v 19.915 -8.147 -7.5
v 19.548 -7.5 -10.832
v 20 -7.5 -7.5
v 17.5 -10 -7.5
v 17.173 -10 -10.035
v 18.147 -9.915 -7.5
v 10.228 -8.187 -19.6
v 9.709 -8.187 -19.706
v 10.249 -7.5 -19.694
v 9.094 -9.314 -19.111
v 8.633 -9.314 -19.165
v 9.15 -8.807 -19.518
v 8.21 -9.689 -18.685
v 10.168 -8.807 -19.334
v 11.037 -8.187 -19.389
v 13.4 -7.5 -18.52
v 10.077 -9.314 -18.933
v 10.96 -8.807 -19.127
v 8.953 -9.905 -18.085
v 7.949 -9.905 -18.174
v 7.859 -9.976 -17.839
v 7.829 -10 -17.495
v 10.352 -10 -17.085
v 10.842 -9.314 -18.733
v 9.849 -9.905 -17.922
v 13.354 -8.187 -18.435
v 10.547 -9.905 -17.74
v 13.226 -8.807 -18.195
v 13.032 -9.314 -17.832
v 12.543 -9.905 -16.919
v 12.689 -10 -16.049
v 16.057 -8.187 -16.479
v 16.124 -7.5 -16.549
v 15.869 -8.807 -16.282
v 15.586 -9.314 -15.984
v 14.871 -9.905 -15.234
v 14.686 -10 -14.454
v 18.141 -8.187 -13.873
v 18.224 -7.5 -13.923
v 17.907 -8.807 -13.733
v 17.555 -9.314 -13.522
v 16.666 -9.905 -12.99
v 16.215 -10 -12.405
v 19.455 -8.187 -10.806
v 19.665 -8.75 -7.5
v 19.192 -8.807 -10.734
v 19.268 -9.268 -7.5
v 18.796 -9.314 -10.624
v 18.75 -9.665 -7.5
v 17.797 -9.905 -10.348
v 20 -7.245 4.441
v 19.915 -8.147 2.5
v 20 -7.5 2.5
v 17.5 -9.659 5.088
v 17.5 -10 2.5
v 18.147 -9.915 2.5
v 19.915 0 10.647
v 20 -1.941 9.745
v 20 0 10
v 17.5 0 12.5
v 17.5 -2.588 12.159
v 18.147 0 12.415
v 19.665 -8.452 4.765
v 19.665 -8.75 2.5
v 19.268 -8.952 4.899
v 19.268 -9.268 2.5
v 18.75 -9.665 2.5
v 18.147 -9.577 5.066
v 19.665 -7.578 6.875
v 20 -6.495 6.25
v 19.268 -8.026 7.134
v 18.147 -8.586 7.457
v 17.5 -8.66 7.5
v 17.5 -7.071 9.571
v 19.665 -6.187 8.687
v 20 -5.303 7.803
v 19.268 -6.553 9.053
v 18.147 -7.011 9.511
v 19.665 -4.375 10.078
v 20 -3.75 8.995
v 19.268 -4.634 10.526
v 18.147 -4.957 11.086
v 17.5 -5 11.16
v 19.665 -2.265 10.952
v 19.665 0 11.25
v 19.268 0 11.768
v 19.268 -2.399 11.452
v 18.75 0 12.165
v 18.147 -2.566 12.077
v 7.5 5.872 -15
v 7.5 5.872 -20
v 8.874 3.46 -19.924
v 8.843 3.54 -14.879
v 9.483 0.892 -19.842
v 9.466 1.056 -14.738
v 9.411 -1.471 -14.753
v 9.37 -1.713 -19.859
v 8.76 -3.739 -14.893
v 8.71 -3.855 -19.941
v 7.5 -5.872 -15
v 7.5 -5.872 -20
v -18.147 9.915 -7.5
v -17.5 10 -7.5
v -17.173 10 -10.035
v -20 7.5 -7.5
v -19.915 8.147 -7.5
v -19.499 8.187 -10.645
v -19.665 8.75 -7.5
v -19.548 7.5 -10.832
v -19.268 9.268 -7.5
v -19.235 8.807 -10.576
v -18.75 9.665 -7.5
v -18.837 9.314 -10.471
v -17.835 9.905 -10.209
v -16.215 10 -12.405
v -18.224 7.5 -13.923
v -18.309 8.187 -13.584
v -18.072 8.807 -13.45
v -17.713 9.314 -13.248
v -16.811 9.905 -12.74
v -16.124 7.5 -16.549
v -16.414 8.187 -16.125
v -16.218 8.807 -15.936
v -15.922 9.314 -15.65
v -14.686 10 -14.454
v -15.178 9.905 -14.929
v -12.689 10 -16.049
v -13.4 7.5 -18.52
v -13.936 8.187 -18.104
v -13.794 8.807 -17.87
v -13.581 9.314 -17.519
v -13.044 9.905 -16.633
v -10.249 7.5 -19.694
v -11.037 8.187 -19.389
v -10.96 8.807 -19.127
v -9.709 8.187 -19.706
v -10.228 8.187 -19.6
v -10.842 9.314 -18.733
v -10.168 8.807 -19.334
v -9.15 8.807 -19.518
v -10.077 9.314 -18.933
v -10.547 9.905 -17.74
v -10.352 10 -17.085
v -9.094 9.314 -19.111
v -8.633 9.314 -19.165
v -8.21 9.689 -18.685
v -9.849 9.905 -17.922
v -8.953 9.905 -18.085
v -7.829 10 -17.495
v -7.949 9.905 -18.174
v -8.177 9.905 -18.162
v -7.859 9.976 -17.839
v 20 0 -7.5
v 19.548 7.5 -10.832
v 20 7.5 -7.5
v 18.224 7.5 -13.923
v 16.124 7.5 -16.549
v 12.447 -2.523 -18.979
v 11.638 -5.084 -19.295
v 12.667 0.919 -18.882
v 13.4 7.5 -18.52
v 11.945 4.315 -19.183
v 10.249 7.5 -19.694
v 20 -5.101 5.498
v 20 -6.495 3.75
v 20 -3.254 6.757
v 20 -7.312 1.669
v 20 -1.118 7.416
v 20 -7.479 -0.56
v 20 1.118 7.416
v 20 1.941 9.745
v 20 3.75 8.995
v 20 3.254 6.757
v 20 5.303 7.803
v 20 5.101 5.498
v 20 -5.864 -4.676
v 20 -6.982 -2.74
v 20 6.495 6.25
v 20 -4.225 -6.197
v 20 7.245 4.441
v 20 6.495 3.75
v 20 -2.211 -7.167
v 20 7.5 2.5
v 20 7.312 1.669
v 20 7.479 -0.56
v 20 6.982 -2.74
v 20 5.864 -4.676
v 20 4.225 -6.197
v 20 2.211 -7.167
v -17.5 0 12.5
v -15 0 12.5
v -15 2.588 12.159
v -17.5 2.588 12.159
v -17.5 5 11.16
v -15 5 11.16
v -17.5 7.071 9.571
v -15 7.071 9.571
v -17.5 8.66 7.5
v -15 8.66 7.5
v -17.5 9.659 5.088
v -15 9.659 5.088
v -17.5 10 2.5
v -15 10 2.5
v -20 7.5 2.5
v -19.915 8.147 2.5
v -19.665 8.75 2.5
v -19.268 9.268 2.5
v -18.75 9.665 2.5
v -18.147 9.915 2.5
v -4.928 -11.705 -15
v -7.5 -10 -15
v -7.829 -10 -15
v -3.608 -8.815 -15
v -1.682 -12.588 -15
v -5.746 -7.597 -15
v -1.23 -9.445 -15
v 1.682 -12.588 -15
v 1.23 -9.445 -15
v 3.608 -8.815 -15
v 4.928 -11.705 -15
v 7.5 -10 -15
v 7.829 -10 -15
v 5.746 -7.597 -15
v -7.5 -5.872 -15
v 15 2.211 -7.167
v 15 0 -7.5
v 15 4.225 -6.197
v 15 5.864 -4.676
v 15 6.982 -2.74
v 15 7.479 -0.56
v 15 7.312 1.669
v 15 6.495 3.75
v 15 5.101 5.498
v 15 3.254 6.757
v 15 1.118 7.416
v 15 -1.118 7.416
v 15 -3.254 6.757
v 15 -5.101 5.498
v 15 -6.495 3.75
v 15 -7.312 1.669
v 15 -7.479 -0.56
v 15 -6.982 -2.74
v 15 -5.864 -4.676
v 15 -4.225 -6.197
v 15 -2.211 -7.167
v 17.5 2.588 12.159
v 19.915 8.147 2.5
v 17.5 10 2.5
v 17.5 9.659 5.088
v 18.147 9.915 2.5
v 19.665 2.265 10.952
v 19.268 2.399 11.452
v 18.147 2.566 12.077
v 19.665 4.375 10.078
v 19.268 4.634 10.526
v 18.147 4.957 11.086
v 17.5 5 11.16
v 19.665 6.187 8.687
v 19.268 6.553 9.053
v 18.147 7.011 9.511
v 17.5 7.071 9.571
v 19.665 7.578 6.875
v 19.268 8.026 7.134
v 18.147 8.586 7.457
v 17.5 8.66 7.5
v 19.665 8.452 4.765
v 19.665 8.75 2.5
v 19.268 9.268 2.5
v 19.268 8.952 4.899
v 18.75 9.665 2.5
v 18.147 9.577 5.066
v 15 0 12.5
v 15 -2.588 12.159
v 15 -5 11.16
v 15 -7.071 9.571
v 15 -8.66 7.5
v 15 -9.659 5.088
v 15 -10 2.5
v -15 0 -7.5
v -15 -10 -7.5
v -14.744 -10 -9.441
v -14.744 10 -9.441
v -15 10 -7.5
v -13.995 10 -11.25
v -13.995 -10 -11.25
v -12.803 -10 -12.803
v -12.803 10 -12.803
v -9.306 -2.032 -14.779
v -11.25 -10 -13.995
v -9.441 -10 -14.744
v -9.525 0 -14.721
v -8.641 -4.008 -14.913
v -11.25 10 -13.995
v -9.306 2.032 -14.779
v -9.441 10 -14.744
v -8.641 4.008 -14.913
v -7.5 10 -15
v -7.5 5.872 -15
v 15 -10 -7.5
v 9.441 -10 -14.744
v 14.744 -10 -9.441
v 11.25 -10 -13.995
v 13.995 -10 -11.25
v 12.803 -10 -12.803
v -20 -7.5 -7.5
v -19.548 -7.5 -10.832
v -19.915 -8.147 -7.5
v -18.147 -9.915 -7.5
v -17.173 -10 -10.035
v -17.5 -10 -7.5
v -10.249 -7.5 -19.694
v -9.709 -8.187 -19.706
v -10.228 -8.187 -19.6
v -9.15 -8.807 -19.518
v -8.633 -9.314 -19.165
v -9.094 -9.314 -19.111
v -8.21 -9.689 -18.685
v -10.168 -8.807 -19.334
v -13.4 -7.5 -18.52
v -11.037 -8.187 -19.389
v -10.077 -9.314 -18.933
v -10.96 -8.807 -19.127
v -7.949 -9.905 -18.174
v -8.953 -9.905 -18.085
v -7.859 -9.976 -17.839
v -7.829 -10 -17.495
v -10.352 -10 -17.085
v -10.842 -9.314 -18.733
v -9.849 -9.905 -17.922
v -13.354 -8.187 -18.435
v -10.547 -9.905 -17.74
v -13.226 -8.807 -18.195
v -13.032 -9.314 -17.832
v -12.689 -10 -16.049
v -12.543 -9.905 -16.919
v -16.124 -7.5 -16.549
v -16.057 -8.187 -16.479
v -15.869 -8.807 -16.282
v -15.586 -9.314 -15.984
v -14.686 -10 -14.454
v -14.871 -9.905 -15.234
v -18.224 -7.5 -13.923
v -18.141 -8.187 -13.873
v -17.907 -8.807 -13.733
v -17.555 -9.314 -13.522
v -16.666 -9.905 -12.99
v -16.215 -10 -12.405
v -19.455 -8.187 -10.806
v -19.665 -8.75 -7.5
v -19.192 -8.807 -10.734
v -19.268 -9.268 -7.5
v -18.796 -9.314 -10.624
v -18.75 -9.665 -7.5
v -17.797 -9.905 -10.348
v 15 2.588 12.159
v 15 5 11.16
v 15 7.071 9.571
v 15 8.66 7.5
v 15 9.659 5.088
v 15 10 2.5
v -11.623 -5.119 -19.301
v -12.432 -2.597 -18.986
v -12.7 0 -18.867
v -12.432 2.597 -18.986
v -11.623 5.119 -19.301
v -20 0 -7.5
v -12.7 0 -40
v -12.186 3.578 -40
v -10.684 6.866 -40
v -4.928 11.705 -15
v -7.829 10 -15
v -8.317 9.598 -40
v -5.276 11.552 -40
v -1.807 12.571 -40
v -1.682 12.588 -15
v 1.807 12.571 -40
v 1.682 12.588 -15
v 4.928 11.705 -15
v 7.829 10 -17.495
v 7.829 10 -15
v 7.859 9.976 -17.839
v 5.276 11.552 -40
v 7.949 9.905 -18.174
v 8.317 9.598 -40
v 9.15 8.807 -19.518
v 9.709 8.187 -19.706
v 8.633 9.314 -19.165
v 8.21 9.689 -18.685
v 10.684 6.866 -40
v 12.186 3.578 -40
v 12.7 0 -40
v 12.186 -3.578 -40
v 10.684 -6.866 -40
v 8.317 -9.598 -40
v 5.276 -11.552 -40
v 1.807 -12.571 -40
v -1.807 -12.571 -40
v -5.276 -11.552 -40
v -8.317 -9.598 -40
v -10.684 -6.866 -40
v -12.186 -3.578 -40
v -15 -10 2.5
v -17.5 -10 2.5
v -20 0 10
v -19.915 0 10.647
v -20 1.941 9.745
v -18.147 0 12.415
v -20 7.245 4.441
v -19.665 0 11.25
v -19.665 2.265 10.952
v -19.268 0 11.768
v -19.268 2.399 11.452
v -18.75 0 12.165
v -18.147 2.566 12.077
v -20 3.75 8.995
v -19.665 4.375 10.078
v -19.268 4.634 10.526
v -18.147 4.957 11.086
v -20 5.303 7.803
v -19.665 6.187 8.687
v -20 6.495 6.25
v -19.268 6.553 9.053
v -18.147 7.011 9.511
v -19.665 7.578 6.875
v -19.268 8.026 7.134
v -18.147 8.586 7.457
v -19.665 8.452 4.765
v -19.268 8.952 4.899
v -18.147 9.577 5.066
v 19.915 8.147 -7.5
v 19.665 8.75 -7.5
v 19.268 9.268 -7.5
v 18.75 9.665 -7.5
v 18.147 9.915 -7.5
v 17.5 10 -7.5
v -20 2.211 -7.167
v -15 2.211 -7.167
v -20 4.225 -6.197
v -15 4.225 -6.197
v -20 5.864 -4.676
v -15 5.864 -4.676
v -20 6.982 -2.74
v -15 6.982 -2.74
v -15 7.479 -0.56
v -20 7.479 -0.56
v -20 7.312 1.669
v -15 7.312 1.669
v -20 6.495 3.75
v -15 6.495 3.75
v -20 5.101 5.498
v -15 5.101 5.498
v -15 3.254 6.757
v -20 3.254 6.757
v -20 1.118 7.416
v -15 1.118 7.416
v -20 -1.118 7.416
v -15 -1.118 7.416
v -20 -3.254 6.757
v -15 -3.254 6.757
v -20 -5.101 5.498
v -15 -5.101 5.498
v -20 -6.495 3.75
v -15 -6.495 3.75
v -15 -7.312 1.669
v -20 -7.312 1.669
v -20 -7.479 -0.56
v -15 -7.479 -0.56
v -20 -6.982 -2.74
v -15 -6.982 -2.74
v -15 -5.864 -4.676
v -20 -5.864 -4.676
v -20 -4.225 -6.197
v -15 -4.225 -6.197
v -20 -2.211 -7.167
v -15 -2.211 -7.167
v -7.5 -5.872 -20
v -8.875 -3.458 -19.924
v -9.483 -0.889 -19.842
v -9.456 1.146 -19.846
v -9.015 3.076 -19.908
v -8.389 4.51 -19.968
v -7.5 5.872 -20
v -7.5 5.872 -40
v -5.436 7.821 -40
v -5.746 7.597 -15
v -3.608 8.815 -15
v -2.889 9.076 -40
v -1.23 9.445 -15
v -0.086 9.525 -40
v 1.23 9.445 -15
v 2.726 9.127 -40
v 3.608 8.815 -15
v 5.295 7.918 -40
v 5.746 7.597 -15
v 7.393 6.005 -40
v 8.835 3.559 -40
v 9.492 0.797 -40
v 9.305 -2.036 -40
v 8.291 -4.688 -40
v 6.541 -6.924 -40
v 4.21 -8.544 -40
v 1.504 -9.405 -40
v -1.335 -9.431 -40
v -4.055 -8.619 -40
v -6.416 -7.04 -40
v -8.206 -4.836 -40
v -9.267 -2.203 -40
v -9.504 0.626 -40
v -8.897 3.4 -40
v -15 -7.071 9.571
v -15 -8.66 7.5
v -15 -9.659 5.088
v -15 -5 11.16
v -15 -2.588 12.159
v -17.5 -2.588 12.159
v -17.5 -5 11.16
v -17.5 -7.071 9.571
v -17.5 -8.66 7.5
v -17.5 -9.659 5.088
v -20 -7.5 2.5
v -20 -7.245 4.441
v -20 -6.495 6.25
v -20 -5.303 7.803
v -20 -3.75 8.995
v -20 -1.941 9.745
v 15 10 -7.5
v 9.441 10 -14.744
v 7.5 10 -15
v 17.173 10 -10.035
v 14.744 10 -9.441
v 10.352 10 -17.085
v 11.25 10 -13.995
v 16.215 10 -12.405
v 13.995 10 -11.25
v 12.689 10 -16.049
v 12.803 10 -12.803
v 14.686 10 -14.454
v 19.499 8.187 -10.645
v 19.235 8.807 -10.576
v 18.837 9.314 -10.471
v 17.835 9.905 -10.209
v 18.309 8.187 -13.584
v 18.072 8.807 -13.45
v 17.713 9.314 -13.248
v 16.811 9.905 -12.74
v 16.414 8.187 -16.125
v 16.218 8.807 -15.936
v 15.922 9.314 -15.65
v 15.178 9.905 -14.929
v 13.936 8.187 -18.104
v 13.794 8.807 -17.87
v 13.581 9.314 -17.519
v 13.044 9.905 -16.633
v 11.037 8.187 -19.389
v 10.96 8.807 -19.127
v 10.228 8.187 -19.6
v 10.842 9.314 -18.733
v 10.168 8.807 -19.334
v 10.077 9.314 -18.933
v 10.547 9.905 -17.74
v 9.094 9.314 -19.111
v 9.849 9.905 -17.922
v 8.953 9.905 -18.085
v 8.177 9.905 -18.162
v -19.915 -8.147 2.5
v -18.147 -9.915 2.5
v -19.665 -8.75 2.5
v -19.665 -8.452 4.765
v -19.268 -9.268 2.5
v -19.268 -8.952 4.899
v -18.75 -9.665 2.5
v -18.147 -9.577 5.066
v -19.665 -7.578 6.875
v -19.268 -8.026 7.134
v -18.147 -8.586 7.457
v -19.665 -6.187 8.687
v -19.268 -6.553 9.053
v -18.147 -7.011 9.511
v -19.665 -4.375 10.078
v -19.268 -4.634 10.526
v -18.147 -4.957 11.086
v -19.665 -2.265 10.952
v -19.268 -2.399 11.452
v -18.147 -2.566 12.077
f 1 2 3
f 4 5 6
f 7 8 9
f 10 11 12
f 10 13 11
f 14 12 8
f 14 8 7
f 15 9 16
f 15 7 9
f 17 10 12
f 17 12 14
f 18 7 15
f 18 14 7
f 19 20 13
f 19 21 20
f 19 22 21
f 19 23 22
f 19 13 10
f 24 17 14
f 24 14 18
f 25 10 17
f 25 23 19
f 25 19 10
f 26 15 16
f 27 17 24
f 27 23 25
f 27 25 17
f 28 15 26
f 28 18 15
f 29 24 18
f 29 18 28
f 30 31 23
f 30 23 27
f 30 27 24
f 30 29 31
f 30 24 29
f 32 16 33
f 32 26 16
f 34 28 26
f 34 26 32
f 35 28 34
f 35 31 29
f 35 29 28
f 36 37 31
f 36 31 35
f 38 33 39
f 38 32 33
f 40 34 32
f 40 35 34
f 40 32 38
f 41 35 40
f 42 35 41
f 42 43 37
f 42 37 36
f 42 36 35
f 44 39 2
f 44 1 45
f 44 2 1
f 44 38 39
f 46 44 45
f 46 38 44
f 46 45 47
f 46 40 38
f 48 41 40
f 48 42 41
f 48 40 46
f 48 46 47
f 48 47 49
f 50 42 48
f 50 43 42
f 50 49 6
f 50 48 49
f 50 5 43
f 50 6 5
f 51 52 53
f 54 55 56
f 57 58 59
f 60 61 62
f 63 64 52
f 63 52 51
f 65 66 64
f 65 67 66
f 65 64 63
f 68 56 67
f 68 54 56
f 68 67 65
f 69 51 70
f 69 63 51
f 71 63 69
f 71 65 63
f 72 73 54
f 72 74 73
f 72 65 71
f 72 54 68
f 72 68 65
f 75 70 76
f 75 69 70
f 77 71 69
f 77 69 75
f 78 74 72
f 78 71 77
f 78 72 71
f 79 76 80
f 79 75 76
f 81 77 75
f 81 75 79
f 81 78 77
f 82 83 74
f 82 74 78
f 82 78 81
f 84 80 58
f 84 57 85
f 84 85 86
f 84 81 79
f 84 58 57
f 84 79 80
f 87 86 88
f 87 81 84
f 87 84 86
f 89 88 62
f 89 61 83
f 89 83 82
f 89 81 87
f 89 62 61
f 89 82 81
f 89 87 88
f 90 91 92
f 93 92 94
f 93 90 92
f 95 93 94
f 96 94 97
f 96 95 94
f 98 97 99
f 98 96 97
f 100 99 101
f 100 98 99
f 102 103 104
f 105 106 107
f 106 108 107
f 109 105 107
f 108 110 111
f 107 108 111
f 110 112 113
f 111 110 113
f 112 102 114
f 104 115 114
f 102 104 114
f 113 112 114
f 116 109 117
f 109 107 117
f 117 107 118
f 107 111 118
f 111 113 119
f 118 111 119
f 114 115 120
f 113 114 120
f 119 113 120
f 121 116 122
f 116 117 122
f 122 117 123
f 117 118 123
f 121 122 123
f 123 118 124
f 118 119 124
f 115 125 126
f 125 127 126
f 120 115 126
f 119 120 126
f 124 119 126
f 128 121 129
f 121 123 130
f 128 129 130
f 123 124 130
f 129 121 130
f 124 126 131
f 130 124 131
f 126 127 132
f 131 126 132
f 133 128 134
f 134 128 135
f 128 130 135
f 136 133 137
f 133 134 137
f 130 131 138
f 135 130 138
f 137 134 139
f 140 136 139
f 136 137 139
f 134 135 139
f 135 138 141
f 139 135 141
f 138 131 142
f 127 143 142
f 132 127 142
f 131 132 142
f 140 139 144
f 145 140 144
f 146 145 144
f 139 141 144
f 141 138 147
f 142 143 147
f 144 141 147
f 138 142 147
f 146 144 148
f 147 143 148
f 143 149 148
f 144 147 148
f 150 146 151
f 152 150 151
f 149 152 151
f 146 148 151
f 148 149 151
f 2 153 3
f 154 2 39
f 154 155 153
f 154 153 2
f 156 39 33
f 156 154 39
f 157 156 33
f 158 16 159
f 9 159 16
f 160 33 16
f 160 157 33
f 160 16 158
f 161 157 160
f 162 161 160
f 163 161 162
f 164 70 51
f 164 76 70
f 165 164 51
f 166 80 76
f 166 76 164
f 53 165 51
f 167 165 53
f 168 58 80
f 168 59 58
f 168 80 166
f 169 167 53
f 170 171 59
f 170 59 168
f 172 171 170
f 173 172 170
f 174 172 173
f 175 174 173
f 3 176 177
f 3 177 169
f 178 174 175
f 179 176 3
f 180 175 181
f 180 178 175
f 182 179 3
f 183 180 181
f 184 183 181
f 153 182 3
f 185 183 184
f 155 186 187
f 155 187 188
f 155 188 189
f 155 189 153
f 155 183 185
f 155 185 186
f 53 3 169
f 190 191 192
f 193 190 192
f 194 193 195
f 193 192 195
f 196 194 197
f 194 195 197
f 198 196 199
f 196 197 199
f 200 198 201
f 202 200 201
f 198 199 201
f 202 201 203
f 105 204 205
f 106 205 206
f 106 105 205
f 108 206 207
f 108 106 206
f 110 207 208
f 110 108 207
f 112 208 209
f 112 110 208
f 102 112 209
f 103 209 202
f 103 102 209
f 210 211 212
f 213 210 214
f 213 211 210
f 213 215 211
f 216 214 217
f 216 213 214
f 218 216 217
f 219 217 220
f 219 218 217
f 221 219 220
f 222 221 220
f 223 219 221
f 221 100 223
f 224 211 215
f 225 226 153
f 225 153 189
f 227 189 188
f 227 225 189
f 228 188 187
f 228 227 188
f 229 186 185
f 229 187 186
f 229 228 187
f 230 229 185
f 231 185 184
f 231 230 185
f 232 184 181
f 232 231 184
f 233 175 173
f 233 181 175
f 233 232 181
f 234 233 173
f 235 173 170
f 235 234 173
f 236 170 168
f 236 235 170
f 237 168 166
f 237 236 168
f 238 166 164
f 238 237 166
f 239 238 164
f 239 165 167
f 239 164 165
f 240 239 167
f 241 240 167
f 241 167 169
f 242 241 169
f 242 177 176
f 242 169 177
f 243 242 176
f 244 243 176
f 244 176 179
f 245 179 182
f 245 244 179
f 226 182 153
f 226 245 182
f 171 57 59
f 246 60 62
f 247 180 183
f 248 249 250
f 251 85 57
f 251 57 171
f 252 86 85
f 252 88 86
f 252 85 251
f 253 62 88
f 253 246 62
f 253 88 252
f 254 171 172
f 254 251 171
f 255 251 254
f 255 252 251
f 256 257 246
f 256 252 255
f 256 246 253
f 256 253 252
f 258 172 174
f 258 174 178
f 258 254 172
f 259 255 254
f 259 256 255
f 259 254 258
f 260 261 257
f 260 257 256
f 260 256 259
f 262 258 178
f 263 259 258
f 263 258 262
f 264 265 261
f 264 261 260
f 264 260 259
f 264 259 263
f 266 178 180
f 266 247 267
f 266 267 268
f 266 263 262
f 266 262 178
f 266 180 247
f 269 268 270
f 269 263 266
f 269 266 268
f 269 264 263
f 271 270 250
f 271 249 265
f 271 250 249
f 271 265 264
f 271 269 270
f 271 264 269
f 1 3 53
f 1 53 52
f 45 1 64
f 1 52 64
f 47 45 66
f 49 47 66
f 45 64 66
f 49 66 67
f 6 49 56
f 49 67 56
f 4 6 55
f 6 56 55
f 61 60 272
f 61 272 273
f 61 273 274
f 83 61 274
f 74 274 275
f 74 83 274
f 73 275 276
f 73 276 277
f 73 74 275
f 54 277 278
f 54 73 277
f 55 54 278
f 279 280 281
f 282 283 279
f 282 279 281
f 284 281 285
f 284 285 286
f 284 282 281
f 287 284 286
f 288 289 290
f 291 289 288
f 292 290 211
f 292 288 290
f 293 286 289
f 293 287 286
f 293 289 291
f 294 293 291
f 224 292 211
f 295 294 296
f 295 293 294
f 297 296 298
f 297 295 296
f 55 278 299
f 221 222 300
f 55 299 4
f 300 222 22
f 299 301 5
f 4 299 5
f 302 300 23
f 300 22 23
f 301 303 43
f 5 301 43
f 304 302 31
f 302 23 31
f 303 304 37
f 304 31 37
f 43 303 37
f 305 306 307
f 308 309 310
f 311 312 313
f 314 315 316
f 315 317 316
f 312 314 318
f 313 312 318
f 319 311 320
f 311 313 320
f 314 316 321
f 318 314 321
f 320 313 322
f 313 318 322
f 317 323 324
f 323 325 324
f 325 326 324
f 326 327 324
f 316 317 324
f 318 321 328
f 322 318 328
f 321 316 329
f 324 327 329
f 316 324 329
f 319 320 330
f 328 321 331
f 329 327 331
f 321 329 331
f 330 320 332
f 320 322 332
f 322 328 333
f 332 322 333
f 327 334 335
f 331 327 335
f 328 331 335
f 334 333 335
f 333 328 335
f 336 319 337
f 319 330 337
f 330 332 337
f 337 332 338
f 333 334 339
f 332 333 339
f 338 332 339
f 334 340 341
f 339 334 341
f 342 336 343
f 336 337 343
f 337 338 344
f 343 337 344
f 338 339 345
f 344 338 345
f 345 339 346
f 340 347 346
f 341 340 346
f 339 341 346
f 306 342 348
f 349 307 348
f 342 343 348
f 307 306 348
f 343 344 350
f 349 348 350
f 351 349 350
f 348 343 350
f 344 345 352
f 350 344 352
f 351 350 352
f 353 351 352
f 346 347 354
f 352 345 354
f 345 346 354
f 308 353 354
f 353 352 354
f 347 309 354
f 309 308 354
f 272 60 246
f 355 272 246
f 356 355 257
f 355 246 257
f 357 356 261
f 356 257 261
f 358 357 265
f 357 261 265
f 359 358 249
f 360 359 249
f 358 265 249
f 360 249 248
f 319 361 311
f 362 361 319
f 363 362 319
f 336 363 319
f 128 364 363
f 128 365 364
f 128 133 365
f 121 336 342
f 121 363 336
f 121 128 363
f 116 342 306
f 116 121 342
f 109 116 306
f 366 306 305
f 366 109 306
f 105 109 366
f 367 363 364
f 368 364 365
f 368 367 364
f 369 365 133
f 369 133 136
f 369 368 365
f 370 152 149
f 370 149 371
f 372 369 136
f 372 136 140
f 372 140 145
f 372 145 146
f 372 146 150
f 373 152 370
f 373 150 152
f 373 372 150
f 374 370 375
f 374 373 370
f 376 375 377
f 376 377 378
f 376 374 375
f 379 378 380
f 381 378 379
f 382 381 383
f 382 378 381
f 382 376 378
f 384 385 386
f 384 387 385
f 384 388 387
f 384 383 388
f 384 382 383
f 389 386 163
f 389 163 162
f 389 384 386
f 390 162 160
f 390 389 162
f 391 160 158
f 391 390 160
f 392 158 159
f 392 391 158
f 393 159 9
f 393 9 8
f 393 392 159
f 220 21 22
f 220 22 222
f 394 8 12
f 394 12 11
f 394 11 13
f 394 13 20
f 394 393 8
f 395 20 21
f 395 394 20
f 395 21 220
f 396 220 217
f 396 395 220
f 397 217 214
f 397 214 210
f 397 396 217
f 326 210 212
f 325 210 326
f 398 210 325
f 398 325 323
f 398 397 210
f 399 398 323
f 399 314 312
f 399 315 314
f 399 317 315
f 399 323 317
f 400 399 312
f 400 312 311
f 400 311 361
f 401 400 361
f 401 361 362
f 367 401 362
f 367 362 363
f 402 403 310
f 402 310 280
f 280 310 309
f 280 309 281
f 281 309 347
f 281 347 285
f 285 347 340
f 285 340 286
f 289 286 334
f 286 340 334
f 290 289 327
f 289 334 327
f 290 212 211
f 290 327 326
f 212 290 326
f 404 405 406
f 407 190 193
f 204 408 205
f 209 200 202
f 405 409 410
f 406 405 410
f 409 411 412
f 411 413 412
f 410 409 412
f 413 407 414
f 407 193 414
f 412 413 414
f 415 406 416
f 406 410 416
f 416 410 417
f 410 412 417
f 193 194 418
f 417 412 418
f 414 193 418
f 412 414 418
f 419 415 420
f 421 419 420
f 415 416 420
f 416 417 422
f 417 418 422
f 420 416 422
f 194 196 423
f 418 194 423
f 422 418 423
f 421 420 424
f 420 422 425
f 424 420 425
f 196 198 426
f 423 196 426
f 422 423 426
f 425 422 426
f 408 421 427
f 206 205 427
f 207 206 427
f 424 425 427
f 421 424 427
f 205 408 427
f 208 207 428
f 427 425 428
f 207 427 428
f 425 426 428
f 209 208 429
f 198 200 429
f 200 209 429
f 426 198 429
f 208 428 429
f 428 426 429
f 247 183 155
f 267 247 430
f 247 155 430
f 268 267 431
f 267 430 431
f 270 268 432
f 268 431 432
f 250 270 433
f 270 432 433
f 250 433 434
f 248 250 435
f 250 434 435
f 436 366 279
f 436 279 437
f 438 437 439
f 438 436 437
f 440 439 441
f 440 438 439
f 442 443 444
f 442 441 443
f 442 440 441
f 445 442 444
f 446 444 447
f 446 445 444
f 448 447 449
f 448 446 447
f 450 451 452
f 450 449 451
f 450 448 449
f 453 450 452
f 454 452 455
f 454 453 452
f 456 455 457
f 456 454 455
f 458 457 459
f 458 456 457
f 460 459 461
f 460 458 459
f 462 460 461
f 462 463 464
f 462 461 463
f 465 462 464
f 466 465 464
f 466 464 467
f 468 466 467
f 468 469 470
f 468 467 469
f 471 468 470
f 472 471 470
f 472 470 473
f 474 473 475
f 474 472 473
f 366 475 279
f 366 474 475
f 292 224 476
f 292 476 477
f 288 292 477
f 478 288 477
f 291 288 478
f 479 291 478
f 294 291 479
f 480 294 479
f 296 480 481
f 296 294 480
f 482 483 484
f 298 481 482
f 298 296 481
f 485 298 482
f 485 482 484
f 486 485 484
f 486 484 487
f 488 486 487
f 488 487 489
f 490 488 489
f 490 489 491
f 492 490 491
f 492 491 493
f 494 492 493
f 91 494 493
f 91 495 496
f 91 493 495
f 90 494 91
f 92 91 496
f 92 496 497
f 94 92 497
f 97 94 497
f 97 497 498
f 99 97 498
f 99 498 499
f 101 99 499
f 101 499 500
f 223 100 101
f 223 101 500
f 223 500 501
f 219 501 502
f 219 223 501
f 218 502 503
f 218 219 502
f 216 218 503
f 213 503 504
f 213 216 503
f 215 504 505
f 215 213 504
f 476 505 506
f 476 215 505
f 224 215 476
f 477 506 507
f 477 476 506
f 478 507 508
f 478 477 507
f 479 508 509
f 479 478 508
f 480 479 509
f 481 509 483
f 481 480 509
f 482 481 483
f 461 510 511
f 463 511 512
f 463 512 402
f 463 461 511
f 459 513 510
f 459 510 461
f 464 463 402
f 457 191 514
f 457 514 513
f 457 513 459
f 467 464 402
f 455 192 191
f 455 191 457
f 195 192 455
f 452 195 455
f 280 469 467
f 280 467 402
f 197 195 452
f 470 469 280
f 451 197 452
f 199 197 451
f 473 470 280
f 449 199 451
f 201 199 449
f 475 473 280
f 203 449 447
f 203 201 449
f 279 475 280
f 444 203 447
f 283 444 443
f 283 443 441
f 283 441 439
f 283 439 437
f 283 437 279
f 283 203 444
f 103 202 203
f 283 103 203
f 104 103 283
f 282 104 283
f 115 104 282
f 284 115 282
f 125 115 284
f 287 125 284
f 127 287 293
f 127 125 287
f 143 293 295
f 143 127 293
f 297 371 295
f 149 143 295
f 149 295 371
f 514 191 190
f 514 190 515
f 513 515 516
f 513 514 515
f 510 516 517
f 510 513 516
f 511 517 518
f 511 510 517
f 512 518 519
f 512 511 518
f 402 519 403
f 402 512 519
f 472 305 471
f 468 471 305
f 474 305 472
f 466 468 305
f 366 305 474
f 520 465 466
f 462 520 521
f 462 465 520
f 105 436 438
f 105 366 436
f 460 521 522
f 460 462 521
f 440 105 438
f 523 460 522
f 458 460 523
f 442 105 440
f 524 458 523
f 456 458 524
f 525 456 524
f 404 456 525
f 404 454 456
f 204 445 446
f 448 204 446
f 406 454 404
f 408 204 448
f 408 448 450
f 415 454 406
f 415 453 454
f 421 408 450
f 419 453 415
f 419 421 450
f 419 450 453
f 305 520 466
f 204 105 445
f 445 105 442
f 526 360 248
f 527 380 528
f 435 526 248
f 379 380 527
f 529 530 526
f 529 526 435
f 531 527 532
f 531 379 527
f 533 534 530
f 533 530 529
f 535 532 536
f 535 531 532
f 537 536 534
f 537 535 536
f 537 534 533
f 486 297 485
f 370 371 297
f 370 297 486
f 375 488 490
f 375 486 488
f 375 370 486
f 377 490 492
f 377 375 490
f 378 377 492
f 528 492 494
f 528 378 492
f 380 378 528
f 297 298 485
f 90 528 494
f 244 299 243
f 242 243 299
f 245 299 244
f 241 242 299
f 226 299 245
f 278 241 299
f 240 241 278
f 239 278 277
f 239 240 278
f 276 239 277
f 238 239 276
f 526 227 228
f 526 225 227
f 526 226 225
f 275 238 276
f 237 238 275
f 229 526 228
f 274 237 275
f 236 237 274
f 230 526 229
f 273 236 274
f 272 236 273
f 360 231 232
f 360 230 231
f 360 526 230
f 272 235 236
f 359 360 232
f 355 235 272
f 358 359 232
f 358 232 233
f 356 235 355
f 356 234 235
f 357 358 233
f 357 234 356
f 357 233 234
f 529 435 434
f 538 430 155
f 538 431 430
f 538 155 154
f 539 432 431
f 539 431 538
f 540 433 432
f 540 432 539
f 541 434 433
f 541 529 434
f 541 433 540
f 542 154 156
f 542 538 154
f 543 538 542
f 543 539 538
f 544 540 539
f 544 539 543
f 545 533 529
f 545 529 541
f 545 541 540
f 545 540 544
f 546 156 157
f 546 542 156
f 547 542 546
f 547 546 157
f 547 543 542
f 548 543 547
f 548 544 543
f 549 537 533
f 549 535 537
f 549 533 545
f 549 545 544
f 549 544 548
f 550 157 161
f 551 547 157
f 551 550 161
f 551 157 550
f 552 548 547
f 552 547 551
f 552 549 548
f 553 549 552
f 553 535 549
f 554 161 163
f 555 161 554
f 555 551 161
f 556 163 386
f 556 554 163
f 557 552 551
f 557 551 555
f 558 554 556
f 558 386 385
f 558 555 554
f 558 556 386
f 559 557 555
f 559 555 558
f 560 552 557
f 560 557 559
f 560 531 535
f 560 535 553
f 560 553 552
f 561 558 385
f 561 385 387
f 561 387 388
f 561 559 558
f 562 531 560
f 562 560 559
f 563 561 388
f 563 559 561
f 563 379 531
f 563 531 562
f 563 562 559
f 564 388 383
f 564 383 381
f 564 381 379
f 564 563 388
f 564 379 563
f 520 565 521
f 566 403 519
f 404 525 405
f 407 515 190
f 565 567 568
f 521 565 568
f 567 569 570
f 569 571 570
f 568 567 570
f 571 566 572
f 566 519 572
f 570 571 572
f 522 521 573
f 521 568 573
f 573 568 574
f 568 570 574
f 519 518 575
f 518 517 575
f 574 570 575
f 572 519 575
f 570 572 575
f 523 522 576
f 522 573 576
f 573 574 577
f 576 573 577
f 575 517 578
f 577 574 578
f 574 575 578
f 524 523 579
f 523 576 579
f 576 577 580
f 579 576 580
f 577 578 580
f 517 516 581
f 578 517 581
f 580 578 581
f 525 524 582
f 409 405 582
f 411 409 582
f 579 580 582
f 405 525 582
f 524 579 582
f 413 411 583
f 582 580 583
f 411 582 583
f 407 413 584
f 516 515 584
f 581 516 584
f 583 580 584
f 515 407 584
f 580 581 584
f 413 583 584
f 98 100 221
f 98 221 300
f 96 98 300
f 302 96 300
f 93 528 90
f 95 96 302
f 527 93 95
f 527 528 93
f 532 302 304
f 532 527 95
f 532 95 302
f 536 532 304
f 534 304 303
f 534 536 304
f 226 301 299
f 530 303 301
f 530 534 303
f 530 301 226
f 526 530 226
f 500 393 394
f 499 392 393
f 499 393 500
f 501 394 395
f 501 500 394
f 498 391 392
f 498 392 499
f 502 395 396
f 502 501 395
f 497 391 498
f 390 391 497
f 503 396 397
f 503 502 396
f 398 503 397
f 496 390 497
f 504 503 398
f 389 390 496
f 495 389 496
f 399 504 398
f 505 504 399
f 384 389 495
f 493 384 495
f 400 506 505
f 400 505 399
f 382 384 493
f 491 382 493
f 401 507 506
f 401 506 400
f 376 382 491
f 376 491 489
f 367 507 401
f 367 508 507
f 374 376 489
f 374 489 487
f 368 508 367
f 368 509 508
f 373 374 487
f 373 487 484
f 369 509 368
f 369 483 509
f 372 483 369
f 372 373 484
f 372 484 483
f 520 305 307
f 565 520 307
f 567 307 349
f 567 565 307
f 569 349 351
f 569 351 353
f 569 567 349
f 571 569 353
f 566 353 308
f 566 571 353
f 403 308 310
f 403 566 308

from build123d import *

# Parameters (mm, degrees)
BOSS_EXTRUDE1_DEPTH             = 10
CUT_EXTRUDE1_DEPTH              = 46.82575695
CUT_EXTRUDE1_DEPTH_BACK         = 46.82575695
SKETCH2_R                       = 7.5
SKETCH3_R                       = 12.7
SKETCH3_R_2                     = 9.525
BOSS_EXTRUDE2_DEPTH             = 20
BOSS_EXTRUDE2_DIRECTION_2_REACH = 41.449
CUT_EXTRUDE2_DEPTH              = 41.21865247
CUT_EXTRUDE2_DEPTH_BACK         = 41.21865247
FILLET1_R                       = 10
FILLET2_R                       = 2.5


with BuildPart() as part:
    # Sketch1 → Boss-Extrude1 (new, symmetric)
    with BuildSketch(Plane(origin=(0, 0, 0), x_dir=(1, 0, 0), z_dir=(0, 1, 0))):
        with BuildLine():
            Line((-20, 7.5), (-20, 0))
            Line((-20, 0), (-15, 0))
            Line((-15, 0), (-15, 7.5))
            ThreePointArc((-15, 7.5), (-12.803300859, 12.803300859), (-7.5, 15))
            Line((-7.5, 15), (7.5, 15))
            ThreePointArc((7.5, 15), (12.803300859, 12.803300859), (15, 7.5))
            Line((15, 7.5), (15, 0))
            Line((15, 0), (20, 0))
            Line((20, 0), (20, 7.5))
            ThreePointArc((20, 7.5), (16.338834765, 16.338834765), (7.5, 20))
            Line((7.5, 20), (-7.5, 20))
            ThreePointArc((-7.5, 20), (-16.338834765, 16.338834765), (-20, 7.5))
        make_face()
        Polygon((-15, 0), (-20, 0), (-20, -7.5), (-20, -12.5), (-15, -12.5), (-15, -7.5), align=None)
        Polygon((20, 0), (15, 0), (15, -7.5), (15, -12.5), (20, -12.5), (20, -7.5), align=None)
    extrude(amount=BOSS_EXTRUDE1_DEPTH, both=True)

    # Sketch2 → Cut-Extrude1 (cut, two sides: drawn at the far end of the back side and taken through both)
    with BuildSketch(Plane(origin=(20, 0, 0), x_dir=(0, 0, -1), z_dir=(1, 0, 0)).offset(-CUT_EXTRUDE1_DEPTH_BACK)):
        Circle(SKETCH2_R)
    extrude(amount=CUT_EXTRUDE1_DEPTH + CUT_EXTRUDE1_DEPTH_BACK, mode=Mode.SUBTRACT)

    # Sketch3 → Boss-Extrude2 (add)
    with BuildSketch(Plane(origin=(0, 0, -20), x_dir=(-1, 0, 0), z_dir=(0, 0, -1))):
        Circle(SKETCH3_R)
        Circle(SKETCH3_R_2, mode=Mode.SUBTRACT)
    extrude(amount=BOSS_EXTRUDE2_DEPTH)

    # Boss-Extrude2 direction 2: up to this face of the body (flat: up to its plane)
    boss_extrude2_direction_2_end = Plane(part.part.faces().sort_by_distance((0, 0, -15))[0])
    # Sketch3 → Boss-Extrude2 direction 2 (add, up to the picked face)
    with BuildSketch(Plane(origin=(0, 0, -20), x_dir=(-1, 0, 0), z_dir=(0, 0, -1)), mode=Mode.PRIVATE) as boss_extrude2_direction_2_sk1:
        Circle(SKETCH3_R)
        Circle(SKETCH3_R_2, mode=Mode.SUBTRACT)
    boss_extrude2_direction_2_tool1 = split(extrude(boss_extrude2_direction_2_sk1.sketch, amount=-BOSS_EXTRUDE2_DIRECTION_2_REACH, mode=Mode.PRIVATE), bisect_by=boss_extrude2_direction_2_end, keep=Keep.BOTH, mode=Mode.PRIVATE)
    add(boss_extrude2_direction_2_tool1.solids().sort_by(Axis((12.34079, 0, -20), (0, 0, 1)))[0])

    # Sketch3<2> → Cut-Extrude2 (cut, two sides: drawn at the far end of the back side and taken through both)
    with BuildSketch(Plane(origin=(0, 0, -20), x_dir=(-1, 0, 0), z_dir=(0, 0, -1)).offset(-CUT_EXTRUDE2_DEPTH_BACK)):
        with BuildLine():
            Line((7.5, -5.871594758), (7.5, 5.871594758))
            ThreePointArc((7.5, 5.871594758), (0, 9.525), (-7.5, 5.871594758))
            Line((-7.5, 5.871594758), (-7.5, -5.871594758))
            ThreePointArc((-7.5, -5.871594758), (0, -9.525), (7.5, -5.871594758))
        make_face()
        with BuildLine():
            Line((-7.5, -5.871594758), (-7.5, 5.871594758))
            ThreePointArc((-7.5, 5.871594758), (-9.525, 0), (-7.5, -5.871594758))
        make_face()
        with BuildLine():
            ThreePointArc((7.5, -5.871594758), (9.00453011, -3.105489092), (9.525, 0))
            ThreePointArc((9.525, 0), (9.00453011, 3.105489092), (7.5, 5.871594758))
            Line((7.5, 5.871594758), (7.5, -5.871594758))
        make_face()
    extrude(amount=CUT_EXTRUDE2_DEPTH + CUT_EXTRUDE2_DEPTH_BACK, mode=Mode.SUBTRACT)

    # Fillet1
    fillet1_edges = [part.edges().sort_by_distance(p)[0] for p in [
        (17.5, -10, 12.5),
        (-17.5, -10, 12.5),
        (-17.5, 10, 12.5),
        (17.5, 10, 12.5),
    ]]
    fillet(fillet1_edges, radius=FILLET1_R - 0.0001)  # a hair under: the kernel refuses the full size

    # Fillet2
    fillet2_edges = [part.edges().sort_by_distance(p)[0] for p in [
        (20, 10, -2.49995),
        (-20, -10, -2.49995),
        (-20, 10, -2.49995),
        (-20, 7.071097101, 9.571097101),
        (-20, -7.071097101, 9.571097101),
        (16.454326123, -10, -16.221814243),
        (-16.454326123, -10, -16.221814243),
        (-16.454326123, 10, -16.221814243),
        (16.454326123, 10, -16.221814243),
        (20, -10, -2.49995),
        (20, 7.071097101, 9.571097101),
    ]]
    fillet(fillet2_edges, radius=FILLET2_R - 0.0001)  # a hair under: the kernel refuses the full size


solid = part.part
